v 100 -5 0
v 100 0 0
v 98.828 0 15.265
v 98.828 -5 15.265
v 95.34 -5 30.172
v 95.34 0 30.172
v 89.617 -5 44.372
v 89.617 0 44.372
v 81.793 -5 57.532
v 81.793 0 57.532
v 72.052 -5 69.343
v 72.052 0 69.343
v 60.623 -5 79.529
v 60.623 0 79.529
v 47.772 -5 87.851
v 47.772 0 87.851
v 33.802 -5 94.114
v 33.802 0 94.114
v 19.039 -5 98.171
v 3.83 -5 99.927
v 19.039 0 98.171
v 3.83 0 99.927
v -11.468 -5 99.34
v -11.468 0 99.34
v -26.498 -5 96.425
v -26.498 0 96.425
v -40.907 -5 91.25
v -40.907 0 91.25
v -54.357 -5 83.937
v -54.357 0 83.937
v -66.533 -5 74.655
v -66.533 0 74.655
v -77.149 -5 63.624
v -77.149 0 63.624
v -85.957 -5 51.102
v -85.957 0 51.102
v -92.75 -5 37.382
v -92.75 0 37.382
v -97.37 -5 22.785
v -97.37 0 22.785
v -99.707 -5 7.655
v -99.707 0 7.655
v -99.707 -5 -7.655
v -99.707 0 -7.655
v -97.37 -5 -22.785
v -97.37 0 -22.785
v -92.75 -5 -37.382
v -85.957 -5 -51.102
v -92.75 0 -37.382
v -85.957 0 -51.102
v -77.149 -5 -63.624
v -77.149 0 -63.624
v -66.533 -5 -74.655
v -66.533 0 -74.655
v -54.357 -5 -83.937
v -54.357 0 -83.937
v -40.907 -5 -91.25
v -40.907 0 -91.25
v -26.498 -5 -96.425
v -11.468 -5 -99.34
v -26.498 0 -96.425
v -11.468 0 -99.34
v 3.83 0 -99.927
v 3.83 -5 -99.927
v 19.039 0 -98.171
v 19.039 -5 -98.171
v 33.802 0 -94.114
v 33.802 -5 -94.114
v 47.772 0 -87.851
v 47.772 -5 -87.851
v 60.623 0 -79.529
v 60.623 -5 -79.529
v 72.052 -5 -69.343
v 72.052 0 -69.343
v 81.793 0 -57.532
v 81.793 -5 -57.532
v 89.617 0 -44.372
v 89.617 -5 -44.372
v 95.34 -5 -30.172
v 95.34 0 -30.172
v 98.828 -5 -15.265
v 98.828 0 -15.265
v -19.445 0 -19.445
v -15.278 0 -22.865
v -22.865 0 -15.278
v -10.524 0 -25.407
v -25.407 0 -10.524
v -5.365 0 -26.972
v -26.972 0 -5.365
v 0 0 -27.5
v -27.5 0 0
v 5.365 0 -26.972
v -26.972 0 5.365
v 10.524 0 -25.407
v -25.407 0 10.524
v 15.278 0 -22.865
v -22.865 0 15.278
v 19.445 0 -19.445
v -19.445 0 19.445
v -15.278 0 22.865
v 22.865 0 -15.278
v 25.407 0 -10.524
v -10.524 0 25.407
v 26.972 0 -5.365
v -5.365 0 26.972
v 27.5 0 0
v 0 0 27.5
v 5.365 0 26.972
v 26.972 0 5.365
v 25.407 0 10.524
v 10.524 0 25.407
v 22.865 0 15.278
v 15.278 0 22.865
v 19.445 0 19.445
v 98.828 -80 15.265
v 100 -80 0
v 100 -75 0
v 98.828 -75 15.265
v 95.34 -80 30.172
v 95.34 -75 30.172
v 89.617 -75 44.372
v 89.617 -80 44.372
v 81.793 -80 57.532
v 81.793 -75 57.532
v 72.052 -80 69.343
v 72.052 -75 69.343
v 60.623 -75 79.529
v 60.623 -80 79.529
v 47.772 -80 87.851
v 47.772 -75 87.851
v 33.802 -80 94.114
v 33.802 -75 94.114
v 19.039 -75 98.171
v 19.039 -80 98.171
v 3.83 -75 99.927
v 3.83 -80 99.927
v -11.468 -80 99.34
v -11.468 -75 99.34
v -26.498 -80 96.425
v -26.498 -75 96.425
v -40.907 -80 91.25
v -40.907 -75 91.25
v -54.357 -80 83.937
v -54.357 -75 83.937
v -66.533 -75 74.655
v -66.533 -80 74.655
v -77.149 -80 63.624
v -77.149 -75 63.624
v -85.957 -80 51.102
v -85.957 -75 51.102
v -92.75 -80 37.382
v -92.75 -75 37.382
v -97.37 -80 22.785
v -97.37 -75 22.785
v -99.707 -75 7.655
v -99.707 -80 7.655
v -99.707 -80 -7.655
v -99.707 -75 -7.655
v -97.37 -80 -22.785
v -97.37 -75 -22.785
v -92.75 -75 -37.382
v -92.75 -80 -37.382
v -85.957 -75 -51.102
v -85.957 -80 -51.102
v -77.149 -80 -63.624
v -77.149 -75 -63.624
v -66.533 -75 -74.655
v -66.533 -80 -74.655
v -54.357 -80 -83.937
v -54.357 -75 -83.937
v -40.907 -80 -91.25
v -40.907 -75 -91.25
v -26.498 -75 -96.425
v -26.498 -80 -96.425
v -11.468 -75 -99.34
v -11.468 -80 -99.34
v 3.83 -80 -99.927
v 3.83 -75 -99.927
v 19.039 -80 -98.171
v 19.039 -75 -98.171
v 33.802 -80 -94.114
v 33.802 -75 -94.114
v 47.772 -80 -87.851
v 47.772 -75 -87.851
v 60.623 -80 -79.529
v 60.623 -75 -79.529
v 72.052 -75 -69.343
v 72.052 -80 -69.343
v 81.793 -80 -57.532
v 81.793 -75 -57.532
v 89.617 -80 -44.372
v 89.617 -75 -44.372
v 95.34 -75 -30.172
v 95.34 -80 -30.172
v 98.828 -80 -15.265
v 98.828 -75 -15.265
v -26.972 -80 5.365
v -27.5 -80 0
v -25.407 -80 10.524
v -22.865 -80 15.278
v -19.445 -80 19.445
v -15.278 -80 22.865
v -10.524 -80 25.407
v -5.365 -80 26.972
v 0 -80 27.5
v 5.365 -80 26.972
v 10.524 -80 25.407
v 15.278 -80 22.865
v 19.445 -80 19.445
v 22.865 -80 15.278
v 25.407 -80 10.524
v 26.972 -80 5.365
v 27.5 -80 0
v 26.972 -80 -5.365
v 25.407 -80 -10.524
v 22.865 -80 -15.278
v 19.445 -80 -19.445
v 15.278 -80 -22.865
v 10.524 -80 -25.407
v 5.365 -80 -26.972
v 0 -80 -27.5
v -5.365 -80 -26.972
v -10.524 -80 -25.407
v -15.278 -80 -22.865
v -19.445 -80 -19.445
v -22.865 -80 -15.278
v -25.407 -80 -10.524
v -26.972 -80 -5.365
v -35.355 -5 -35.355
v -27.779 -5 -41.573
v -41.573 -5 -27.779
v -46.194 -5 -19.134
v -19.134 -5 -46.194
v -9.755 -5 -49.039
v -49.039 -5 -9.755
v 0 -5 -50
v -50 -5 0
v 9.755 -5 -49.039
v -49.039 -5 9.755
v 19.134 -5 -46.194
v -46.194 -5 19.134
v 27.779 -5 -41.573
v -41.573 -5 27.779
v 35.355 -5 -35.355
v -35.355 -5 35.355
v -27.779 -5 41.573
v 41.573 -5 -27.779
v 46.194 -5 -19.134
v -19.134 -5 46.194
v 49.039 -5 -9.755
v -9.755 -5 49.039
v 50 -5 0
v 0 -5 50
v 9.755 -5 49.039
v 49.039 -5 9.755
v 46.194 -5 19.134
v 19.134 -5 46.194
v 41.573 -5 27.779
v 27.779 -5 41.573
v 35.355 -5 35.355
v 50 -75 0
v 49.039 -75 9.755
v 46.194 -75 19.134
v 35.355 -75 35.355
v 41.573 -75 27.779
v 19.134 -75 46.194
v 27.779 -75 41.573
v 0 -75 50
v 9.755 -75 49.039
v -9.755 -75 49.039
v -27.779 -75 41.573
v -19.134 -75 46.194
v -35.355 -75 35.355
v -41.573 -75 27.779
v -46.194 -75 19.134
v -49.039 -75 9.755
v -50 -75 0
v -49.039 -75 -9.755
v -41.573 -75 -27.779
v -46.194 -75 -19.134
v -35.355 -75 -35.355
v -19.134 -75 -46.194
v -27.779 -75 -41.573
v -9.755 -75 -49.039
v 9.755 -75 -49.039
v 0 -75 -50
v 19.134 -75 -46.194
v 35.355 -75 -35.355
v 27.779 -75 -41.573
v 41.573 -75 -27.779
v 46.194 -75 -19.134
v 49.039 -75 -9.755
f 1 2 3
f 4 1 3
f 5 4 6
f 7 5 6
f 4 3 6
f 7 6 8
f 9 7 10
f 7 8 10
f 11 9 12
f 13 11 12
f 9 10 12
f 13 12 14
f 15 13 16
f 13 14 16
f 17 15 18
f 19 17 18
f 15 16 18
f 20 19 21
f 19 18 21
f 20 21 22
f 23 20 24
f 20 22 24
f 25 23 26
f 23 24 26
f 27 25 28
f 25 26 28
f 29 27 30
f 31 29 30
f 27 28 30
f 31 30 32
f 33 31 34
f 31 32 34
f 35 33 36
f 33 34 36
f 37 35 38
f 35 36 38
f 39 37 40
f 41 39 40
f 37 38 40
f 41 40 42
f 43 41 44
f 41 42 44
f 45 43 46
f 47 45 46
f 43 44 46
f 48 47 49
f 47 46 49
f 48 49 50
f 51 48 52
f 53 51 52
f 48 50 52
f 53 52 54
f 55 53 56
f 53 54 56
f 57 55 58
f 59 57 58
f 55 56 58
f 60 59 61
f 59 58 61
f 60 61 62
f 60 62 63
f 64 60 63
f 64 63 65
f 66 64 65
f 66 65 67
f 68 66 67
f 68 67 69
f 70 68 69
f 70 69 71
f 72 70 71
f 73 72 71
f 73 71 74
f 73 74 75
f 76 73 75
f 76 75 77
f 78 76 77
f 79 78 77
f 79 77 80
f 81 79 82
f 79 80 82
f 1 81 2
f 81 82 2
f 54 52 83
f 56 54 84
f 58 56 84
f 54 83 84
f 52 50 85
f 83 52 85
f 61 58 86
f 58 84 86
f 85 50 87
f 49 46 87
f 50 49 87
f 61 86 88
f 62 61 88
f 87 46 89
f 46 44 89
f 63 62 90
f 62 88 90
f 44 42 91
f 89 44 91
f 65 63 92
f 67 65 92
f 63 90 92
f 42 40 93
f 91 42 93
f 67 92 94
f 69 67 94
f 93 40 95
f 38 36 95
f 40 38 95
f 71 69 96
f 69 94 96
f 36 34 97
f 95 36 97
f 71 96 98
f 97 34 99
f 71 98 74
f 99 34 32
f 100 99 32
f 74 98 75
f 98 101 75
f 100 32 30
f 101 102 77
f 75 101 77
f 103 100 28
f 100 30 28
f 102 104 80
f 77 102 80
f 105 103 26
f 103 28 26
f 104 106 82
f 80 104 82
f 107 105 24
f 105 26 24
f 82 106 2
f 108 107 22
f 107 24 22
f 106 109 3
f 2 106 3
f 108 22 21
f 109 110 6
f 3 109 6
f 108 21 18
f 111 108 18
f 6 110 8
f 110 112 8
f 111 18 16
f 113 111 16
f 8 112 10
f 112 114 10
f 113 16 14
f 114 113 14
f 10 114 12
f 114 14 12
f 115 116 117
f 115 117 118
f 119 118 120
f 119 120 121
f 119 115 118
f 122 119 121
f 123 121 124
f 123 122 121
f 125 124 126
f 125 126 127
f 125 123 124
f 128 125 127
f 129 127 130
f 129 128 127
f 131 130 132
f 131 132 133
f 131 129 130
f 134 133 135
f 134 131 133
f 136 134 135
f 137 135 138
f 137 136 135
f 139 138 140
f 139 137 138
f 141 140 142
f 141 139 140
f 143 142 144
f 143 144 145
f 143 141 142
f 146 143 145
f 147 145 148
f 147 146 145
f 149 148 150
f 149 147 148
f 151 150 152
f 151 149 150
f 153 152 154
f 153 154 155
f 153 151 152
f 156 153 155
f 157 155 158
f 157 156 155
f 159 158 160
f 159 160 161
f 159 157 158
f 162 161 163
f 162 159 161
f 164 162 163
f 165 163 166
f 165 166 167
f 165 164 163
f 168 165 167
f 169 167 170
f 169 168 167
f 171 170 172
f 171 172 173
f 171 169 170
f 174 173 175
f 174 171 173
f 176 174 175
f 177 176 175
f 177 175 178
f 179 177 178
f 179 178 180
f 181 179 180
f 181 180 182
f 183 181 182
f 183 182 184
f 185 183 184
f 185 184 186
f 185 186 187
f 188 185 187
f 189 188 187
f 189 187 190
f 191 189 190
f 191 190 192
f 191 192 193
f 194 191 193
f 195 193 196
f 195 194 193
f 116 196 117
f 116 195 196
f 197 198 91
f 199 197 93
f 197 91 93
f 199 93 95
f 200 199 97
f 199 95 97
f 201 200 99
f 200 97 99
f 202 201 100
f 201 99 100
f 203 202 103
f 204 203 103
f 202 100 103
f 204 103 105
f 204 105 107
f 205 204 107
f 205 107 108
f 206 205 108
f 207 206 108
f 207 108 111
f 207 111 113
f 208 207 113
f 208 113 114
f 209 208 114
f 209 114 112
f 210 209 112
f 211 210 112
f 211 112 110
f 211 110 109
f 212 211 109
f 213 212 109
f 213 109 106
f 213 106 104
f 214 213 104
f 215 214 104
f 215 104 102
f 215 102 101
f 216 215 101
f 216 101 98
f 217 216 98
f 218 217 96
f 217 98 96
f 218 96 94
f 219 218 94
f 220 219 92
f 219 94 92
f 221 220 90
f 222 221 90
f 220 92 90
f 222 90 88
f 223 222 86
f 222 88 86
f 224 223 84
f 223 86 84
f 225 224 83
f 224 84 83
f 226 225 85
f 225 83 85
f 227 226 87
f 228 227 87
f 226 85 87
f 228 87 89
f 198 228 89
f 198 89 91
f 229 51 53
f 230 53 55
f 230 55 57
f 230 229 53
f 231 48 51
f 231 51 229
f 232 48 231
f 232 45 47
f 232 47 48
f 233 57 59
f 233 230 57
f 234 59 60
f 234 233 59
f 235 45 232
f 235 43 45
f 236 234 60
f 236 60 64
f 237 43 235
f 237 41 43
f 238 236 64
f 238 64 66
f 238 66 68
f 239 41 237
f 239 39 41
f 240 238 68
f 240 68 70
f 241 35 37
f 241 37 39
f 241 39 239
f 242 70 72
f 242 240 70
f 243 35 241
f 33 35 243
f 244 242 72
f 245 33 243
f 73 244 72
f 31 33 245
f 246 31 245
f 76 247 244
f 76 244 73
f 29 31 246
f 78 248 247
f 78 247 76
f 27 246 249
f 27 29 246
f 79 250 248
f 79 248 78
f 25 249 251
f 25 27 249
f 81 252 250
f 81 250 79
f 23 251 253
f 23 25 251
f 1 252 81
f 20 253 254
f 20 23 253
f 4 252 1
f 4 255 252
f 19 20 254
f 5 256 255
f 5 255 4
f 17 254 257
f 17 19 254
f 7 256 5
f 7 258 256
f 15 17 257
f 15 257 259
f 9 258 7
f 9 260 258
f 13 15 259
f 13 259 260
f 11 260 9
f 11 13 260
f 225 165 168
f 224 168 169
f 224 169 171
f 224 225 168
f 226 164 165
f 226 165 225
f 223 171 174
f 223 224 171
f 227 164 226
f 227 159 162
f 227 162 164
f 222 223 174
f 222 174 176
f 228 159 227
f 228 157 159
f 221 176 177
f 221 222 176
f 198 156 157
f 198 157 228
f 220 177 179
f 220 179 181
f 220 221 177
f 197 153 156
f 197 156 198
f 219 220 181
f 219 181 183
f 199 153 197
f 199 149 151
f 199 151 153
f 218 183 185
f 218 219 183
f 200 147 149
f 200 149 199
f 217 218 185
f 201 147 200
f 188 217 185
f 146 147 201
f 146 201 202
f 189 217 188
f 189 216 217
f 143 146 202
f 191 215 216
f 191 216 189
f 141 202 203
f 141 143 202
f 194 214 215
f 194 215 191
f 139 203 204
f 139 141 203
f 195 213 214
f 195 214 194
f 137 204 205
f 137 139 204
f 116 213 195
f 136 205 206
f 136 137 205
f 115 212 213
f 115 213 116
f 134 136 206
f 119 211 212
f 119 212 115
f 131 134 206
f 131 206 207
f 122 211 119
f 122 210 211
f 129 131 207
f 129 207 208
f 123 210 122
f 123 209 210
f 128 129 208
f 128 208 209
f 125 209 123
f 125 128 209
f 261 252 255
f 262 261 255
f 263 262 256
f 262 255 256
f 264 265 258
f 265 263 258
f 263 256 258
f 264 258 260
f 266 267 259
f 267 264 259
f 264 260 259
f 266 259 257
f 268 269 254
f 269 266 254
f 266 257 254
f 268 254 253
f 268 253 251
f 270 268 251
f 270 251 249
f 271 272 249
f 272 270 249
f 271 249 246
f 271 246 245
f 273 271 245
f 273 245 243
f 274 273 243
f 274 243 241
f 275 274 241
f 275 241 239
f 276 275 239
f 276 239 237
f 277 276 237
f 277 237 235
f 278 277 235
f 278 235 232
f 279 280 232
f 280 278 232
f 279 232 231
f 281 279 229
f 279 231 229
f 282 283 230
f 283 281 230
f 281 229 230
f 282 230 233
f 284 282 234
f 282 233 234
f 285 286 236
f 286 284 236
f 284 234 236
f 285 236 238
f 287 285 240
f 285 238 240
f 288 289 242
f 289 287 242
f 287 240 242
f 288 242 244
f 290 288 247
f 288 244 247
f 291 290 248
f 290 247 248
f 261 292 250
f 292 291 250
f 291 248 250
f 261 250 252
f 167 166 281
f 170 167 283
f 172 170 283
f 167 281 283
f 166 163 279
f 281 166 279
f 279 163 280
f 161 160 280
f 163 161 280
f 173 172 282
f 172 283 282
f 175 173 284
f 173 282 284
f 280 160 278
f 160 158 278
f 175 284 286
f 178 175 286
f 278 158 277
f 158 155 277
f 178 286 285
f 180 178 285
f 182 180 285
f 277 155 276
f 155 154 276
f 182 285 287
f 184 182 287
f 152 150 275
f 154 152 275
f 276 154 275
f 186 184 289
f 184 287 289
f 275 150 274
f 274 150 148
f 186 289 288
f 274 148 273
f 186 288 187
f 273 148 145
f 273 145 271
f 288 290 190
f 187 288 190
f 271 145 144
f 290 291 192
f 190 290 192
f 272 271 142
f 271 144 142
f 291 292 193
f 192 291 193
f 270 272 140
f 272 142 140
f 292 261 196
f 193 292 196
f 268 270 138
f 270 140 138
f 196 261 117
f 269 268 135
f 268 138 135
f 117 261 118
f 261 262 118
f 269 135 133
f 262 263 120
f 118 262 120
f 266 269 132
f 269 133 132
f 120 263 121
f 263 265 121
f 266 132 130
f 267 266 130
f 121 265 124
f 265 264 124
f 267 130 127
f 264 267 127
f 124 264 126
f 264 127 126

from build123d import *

# Parameters (mm, degrees)
F0_R     = 50
F1_DEPTH = 80
F2_R     = 100
F3_DEPTH = 5
F4_R     = 100
F5_DEPTH = 5
F6_R     = 27.5
F7_DEPTH = 100


with BuildPart() as f1:
    # F0 (on Front) → F1 (new body)
    with BuildSketch(Plane.XZ):
        Circle(F0_R)
    extrude(amount=F1_DEPTH)

    # F2 (on Front) → F3 (join)
    with BuildSketch(Plane.XZ):
        Circle(F2_R)
    extrude(amount=F3_DEPTH)

    # F4 (on face) → F5 (join)
    with BuildSketch(Plane.XZ.offset(80)):
        Circle(F4_R)
    extrude(amount=-F5_DEPTH)

    # F6 (on face) → F7 (cut)
    with BuildSketch(Plane(origin=(0, 0, 0), x_dir=(-1, 0, 0), z_dir=(0, 1, 0))):
        Circle(F6_R)
    extrude(amount=-F7_DEPTH, mode=Mode.SUBTRACT)


solid = f1.part
